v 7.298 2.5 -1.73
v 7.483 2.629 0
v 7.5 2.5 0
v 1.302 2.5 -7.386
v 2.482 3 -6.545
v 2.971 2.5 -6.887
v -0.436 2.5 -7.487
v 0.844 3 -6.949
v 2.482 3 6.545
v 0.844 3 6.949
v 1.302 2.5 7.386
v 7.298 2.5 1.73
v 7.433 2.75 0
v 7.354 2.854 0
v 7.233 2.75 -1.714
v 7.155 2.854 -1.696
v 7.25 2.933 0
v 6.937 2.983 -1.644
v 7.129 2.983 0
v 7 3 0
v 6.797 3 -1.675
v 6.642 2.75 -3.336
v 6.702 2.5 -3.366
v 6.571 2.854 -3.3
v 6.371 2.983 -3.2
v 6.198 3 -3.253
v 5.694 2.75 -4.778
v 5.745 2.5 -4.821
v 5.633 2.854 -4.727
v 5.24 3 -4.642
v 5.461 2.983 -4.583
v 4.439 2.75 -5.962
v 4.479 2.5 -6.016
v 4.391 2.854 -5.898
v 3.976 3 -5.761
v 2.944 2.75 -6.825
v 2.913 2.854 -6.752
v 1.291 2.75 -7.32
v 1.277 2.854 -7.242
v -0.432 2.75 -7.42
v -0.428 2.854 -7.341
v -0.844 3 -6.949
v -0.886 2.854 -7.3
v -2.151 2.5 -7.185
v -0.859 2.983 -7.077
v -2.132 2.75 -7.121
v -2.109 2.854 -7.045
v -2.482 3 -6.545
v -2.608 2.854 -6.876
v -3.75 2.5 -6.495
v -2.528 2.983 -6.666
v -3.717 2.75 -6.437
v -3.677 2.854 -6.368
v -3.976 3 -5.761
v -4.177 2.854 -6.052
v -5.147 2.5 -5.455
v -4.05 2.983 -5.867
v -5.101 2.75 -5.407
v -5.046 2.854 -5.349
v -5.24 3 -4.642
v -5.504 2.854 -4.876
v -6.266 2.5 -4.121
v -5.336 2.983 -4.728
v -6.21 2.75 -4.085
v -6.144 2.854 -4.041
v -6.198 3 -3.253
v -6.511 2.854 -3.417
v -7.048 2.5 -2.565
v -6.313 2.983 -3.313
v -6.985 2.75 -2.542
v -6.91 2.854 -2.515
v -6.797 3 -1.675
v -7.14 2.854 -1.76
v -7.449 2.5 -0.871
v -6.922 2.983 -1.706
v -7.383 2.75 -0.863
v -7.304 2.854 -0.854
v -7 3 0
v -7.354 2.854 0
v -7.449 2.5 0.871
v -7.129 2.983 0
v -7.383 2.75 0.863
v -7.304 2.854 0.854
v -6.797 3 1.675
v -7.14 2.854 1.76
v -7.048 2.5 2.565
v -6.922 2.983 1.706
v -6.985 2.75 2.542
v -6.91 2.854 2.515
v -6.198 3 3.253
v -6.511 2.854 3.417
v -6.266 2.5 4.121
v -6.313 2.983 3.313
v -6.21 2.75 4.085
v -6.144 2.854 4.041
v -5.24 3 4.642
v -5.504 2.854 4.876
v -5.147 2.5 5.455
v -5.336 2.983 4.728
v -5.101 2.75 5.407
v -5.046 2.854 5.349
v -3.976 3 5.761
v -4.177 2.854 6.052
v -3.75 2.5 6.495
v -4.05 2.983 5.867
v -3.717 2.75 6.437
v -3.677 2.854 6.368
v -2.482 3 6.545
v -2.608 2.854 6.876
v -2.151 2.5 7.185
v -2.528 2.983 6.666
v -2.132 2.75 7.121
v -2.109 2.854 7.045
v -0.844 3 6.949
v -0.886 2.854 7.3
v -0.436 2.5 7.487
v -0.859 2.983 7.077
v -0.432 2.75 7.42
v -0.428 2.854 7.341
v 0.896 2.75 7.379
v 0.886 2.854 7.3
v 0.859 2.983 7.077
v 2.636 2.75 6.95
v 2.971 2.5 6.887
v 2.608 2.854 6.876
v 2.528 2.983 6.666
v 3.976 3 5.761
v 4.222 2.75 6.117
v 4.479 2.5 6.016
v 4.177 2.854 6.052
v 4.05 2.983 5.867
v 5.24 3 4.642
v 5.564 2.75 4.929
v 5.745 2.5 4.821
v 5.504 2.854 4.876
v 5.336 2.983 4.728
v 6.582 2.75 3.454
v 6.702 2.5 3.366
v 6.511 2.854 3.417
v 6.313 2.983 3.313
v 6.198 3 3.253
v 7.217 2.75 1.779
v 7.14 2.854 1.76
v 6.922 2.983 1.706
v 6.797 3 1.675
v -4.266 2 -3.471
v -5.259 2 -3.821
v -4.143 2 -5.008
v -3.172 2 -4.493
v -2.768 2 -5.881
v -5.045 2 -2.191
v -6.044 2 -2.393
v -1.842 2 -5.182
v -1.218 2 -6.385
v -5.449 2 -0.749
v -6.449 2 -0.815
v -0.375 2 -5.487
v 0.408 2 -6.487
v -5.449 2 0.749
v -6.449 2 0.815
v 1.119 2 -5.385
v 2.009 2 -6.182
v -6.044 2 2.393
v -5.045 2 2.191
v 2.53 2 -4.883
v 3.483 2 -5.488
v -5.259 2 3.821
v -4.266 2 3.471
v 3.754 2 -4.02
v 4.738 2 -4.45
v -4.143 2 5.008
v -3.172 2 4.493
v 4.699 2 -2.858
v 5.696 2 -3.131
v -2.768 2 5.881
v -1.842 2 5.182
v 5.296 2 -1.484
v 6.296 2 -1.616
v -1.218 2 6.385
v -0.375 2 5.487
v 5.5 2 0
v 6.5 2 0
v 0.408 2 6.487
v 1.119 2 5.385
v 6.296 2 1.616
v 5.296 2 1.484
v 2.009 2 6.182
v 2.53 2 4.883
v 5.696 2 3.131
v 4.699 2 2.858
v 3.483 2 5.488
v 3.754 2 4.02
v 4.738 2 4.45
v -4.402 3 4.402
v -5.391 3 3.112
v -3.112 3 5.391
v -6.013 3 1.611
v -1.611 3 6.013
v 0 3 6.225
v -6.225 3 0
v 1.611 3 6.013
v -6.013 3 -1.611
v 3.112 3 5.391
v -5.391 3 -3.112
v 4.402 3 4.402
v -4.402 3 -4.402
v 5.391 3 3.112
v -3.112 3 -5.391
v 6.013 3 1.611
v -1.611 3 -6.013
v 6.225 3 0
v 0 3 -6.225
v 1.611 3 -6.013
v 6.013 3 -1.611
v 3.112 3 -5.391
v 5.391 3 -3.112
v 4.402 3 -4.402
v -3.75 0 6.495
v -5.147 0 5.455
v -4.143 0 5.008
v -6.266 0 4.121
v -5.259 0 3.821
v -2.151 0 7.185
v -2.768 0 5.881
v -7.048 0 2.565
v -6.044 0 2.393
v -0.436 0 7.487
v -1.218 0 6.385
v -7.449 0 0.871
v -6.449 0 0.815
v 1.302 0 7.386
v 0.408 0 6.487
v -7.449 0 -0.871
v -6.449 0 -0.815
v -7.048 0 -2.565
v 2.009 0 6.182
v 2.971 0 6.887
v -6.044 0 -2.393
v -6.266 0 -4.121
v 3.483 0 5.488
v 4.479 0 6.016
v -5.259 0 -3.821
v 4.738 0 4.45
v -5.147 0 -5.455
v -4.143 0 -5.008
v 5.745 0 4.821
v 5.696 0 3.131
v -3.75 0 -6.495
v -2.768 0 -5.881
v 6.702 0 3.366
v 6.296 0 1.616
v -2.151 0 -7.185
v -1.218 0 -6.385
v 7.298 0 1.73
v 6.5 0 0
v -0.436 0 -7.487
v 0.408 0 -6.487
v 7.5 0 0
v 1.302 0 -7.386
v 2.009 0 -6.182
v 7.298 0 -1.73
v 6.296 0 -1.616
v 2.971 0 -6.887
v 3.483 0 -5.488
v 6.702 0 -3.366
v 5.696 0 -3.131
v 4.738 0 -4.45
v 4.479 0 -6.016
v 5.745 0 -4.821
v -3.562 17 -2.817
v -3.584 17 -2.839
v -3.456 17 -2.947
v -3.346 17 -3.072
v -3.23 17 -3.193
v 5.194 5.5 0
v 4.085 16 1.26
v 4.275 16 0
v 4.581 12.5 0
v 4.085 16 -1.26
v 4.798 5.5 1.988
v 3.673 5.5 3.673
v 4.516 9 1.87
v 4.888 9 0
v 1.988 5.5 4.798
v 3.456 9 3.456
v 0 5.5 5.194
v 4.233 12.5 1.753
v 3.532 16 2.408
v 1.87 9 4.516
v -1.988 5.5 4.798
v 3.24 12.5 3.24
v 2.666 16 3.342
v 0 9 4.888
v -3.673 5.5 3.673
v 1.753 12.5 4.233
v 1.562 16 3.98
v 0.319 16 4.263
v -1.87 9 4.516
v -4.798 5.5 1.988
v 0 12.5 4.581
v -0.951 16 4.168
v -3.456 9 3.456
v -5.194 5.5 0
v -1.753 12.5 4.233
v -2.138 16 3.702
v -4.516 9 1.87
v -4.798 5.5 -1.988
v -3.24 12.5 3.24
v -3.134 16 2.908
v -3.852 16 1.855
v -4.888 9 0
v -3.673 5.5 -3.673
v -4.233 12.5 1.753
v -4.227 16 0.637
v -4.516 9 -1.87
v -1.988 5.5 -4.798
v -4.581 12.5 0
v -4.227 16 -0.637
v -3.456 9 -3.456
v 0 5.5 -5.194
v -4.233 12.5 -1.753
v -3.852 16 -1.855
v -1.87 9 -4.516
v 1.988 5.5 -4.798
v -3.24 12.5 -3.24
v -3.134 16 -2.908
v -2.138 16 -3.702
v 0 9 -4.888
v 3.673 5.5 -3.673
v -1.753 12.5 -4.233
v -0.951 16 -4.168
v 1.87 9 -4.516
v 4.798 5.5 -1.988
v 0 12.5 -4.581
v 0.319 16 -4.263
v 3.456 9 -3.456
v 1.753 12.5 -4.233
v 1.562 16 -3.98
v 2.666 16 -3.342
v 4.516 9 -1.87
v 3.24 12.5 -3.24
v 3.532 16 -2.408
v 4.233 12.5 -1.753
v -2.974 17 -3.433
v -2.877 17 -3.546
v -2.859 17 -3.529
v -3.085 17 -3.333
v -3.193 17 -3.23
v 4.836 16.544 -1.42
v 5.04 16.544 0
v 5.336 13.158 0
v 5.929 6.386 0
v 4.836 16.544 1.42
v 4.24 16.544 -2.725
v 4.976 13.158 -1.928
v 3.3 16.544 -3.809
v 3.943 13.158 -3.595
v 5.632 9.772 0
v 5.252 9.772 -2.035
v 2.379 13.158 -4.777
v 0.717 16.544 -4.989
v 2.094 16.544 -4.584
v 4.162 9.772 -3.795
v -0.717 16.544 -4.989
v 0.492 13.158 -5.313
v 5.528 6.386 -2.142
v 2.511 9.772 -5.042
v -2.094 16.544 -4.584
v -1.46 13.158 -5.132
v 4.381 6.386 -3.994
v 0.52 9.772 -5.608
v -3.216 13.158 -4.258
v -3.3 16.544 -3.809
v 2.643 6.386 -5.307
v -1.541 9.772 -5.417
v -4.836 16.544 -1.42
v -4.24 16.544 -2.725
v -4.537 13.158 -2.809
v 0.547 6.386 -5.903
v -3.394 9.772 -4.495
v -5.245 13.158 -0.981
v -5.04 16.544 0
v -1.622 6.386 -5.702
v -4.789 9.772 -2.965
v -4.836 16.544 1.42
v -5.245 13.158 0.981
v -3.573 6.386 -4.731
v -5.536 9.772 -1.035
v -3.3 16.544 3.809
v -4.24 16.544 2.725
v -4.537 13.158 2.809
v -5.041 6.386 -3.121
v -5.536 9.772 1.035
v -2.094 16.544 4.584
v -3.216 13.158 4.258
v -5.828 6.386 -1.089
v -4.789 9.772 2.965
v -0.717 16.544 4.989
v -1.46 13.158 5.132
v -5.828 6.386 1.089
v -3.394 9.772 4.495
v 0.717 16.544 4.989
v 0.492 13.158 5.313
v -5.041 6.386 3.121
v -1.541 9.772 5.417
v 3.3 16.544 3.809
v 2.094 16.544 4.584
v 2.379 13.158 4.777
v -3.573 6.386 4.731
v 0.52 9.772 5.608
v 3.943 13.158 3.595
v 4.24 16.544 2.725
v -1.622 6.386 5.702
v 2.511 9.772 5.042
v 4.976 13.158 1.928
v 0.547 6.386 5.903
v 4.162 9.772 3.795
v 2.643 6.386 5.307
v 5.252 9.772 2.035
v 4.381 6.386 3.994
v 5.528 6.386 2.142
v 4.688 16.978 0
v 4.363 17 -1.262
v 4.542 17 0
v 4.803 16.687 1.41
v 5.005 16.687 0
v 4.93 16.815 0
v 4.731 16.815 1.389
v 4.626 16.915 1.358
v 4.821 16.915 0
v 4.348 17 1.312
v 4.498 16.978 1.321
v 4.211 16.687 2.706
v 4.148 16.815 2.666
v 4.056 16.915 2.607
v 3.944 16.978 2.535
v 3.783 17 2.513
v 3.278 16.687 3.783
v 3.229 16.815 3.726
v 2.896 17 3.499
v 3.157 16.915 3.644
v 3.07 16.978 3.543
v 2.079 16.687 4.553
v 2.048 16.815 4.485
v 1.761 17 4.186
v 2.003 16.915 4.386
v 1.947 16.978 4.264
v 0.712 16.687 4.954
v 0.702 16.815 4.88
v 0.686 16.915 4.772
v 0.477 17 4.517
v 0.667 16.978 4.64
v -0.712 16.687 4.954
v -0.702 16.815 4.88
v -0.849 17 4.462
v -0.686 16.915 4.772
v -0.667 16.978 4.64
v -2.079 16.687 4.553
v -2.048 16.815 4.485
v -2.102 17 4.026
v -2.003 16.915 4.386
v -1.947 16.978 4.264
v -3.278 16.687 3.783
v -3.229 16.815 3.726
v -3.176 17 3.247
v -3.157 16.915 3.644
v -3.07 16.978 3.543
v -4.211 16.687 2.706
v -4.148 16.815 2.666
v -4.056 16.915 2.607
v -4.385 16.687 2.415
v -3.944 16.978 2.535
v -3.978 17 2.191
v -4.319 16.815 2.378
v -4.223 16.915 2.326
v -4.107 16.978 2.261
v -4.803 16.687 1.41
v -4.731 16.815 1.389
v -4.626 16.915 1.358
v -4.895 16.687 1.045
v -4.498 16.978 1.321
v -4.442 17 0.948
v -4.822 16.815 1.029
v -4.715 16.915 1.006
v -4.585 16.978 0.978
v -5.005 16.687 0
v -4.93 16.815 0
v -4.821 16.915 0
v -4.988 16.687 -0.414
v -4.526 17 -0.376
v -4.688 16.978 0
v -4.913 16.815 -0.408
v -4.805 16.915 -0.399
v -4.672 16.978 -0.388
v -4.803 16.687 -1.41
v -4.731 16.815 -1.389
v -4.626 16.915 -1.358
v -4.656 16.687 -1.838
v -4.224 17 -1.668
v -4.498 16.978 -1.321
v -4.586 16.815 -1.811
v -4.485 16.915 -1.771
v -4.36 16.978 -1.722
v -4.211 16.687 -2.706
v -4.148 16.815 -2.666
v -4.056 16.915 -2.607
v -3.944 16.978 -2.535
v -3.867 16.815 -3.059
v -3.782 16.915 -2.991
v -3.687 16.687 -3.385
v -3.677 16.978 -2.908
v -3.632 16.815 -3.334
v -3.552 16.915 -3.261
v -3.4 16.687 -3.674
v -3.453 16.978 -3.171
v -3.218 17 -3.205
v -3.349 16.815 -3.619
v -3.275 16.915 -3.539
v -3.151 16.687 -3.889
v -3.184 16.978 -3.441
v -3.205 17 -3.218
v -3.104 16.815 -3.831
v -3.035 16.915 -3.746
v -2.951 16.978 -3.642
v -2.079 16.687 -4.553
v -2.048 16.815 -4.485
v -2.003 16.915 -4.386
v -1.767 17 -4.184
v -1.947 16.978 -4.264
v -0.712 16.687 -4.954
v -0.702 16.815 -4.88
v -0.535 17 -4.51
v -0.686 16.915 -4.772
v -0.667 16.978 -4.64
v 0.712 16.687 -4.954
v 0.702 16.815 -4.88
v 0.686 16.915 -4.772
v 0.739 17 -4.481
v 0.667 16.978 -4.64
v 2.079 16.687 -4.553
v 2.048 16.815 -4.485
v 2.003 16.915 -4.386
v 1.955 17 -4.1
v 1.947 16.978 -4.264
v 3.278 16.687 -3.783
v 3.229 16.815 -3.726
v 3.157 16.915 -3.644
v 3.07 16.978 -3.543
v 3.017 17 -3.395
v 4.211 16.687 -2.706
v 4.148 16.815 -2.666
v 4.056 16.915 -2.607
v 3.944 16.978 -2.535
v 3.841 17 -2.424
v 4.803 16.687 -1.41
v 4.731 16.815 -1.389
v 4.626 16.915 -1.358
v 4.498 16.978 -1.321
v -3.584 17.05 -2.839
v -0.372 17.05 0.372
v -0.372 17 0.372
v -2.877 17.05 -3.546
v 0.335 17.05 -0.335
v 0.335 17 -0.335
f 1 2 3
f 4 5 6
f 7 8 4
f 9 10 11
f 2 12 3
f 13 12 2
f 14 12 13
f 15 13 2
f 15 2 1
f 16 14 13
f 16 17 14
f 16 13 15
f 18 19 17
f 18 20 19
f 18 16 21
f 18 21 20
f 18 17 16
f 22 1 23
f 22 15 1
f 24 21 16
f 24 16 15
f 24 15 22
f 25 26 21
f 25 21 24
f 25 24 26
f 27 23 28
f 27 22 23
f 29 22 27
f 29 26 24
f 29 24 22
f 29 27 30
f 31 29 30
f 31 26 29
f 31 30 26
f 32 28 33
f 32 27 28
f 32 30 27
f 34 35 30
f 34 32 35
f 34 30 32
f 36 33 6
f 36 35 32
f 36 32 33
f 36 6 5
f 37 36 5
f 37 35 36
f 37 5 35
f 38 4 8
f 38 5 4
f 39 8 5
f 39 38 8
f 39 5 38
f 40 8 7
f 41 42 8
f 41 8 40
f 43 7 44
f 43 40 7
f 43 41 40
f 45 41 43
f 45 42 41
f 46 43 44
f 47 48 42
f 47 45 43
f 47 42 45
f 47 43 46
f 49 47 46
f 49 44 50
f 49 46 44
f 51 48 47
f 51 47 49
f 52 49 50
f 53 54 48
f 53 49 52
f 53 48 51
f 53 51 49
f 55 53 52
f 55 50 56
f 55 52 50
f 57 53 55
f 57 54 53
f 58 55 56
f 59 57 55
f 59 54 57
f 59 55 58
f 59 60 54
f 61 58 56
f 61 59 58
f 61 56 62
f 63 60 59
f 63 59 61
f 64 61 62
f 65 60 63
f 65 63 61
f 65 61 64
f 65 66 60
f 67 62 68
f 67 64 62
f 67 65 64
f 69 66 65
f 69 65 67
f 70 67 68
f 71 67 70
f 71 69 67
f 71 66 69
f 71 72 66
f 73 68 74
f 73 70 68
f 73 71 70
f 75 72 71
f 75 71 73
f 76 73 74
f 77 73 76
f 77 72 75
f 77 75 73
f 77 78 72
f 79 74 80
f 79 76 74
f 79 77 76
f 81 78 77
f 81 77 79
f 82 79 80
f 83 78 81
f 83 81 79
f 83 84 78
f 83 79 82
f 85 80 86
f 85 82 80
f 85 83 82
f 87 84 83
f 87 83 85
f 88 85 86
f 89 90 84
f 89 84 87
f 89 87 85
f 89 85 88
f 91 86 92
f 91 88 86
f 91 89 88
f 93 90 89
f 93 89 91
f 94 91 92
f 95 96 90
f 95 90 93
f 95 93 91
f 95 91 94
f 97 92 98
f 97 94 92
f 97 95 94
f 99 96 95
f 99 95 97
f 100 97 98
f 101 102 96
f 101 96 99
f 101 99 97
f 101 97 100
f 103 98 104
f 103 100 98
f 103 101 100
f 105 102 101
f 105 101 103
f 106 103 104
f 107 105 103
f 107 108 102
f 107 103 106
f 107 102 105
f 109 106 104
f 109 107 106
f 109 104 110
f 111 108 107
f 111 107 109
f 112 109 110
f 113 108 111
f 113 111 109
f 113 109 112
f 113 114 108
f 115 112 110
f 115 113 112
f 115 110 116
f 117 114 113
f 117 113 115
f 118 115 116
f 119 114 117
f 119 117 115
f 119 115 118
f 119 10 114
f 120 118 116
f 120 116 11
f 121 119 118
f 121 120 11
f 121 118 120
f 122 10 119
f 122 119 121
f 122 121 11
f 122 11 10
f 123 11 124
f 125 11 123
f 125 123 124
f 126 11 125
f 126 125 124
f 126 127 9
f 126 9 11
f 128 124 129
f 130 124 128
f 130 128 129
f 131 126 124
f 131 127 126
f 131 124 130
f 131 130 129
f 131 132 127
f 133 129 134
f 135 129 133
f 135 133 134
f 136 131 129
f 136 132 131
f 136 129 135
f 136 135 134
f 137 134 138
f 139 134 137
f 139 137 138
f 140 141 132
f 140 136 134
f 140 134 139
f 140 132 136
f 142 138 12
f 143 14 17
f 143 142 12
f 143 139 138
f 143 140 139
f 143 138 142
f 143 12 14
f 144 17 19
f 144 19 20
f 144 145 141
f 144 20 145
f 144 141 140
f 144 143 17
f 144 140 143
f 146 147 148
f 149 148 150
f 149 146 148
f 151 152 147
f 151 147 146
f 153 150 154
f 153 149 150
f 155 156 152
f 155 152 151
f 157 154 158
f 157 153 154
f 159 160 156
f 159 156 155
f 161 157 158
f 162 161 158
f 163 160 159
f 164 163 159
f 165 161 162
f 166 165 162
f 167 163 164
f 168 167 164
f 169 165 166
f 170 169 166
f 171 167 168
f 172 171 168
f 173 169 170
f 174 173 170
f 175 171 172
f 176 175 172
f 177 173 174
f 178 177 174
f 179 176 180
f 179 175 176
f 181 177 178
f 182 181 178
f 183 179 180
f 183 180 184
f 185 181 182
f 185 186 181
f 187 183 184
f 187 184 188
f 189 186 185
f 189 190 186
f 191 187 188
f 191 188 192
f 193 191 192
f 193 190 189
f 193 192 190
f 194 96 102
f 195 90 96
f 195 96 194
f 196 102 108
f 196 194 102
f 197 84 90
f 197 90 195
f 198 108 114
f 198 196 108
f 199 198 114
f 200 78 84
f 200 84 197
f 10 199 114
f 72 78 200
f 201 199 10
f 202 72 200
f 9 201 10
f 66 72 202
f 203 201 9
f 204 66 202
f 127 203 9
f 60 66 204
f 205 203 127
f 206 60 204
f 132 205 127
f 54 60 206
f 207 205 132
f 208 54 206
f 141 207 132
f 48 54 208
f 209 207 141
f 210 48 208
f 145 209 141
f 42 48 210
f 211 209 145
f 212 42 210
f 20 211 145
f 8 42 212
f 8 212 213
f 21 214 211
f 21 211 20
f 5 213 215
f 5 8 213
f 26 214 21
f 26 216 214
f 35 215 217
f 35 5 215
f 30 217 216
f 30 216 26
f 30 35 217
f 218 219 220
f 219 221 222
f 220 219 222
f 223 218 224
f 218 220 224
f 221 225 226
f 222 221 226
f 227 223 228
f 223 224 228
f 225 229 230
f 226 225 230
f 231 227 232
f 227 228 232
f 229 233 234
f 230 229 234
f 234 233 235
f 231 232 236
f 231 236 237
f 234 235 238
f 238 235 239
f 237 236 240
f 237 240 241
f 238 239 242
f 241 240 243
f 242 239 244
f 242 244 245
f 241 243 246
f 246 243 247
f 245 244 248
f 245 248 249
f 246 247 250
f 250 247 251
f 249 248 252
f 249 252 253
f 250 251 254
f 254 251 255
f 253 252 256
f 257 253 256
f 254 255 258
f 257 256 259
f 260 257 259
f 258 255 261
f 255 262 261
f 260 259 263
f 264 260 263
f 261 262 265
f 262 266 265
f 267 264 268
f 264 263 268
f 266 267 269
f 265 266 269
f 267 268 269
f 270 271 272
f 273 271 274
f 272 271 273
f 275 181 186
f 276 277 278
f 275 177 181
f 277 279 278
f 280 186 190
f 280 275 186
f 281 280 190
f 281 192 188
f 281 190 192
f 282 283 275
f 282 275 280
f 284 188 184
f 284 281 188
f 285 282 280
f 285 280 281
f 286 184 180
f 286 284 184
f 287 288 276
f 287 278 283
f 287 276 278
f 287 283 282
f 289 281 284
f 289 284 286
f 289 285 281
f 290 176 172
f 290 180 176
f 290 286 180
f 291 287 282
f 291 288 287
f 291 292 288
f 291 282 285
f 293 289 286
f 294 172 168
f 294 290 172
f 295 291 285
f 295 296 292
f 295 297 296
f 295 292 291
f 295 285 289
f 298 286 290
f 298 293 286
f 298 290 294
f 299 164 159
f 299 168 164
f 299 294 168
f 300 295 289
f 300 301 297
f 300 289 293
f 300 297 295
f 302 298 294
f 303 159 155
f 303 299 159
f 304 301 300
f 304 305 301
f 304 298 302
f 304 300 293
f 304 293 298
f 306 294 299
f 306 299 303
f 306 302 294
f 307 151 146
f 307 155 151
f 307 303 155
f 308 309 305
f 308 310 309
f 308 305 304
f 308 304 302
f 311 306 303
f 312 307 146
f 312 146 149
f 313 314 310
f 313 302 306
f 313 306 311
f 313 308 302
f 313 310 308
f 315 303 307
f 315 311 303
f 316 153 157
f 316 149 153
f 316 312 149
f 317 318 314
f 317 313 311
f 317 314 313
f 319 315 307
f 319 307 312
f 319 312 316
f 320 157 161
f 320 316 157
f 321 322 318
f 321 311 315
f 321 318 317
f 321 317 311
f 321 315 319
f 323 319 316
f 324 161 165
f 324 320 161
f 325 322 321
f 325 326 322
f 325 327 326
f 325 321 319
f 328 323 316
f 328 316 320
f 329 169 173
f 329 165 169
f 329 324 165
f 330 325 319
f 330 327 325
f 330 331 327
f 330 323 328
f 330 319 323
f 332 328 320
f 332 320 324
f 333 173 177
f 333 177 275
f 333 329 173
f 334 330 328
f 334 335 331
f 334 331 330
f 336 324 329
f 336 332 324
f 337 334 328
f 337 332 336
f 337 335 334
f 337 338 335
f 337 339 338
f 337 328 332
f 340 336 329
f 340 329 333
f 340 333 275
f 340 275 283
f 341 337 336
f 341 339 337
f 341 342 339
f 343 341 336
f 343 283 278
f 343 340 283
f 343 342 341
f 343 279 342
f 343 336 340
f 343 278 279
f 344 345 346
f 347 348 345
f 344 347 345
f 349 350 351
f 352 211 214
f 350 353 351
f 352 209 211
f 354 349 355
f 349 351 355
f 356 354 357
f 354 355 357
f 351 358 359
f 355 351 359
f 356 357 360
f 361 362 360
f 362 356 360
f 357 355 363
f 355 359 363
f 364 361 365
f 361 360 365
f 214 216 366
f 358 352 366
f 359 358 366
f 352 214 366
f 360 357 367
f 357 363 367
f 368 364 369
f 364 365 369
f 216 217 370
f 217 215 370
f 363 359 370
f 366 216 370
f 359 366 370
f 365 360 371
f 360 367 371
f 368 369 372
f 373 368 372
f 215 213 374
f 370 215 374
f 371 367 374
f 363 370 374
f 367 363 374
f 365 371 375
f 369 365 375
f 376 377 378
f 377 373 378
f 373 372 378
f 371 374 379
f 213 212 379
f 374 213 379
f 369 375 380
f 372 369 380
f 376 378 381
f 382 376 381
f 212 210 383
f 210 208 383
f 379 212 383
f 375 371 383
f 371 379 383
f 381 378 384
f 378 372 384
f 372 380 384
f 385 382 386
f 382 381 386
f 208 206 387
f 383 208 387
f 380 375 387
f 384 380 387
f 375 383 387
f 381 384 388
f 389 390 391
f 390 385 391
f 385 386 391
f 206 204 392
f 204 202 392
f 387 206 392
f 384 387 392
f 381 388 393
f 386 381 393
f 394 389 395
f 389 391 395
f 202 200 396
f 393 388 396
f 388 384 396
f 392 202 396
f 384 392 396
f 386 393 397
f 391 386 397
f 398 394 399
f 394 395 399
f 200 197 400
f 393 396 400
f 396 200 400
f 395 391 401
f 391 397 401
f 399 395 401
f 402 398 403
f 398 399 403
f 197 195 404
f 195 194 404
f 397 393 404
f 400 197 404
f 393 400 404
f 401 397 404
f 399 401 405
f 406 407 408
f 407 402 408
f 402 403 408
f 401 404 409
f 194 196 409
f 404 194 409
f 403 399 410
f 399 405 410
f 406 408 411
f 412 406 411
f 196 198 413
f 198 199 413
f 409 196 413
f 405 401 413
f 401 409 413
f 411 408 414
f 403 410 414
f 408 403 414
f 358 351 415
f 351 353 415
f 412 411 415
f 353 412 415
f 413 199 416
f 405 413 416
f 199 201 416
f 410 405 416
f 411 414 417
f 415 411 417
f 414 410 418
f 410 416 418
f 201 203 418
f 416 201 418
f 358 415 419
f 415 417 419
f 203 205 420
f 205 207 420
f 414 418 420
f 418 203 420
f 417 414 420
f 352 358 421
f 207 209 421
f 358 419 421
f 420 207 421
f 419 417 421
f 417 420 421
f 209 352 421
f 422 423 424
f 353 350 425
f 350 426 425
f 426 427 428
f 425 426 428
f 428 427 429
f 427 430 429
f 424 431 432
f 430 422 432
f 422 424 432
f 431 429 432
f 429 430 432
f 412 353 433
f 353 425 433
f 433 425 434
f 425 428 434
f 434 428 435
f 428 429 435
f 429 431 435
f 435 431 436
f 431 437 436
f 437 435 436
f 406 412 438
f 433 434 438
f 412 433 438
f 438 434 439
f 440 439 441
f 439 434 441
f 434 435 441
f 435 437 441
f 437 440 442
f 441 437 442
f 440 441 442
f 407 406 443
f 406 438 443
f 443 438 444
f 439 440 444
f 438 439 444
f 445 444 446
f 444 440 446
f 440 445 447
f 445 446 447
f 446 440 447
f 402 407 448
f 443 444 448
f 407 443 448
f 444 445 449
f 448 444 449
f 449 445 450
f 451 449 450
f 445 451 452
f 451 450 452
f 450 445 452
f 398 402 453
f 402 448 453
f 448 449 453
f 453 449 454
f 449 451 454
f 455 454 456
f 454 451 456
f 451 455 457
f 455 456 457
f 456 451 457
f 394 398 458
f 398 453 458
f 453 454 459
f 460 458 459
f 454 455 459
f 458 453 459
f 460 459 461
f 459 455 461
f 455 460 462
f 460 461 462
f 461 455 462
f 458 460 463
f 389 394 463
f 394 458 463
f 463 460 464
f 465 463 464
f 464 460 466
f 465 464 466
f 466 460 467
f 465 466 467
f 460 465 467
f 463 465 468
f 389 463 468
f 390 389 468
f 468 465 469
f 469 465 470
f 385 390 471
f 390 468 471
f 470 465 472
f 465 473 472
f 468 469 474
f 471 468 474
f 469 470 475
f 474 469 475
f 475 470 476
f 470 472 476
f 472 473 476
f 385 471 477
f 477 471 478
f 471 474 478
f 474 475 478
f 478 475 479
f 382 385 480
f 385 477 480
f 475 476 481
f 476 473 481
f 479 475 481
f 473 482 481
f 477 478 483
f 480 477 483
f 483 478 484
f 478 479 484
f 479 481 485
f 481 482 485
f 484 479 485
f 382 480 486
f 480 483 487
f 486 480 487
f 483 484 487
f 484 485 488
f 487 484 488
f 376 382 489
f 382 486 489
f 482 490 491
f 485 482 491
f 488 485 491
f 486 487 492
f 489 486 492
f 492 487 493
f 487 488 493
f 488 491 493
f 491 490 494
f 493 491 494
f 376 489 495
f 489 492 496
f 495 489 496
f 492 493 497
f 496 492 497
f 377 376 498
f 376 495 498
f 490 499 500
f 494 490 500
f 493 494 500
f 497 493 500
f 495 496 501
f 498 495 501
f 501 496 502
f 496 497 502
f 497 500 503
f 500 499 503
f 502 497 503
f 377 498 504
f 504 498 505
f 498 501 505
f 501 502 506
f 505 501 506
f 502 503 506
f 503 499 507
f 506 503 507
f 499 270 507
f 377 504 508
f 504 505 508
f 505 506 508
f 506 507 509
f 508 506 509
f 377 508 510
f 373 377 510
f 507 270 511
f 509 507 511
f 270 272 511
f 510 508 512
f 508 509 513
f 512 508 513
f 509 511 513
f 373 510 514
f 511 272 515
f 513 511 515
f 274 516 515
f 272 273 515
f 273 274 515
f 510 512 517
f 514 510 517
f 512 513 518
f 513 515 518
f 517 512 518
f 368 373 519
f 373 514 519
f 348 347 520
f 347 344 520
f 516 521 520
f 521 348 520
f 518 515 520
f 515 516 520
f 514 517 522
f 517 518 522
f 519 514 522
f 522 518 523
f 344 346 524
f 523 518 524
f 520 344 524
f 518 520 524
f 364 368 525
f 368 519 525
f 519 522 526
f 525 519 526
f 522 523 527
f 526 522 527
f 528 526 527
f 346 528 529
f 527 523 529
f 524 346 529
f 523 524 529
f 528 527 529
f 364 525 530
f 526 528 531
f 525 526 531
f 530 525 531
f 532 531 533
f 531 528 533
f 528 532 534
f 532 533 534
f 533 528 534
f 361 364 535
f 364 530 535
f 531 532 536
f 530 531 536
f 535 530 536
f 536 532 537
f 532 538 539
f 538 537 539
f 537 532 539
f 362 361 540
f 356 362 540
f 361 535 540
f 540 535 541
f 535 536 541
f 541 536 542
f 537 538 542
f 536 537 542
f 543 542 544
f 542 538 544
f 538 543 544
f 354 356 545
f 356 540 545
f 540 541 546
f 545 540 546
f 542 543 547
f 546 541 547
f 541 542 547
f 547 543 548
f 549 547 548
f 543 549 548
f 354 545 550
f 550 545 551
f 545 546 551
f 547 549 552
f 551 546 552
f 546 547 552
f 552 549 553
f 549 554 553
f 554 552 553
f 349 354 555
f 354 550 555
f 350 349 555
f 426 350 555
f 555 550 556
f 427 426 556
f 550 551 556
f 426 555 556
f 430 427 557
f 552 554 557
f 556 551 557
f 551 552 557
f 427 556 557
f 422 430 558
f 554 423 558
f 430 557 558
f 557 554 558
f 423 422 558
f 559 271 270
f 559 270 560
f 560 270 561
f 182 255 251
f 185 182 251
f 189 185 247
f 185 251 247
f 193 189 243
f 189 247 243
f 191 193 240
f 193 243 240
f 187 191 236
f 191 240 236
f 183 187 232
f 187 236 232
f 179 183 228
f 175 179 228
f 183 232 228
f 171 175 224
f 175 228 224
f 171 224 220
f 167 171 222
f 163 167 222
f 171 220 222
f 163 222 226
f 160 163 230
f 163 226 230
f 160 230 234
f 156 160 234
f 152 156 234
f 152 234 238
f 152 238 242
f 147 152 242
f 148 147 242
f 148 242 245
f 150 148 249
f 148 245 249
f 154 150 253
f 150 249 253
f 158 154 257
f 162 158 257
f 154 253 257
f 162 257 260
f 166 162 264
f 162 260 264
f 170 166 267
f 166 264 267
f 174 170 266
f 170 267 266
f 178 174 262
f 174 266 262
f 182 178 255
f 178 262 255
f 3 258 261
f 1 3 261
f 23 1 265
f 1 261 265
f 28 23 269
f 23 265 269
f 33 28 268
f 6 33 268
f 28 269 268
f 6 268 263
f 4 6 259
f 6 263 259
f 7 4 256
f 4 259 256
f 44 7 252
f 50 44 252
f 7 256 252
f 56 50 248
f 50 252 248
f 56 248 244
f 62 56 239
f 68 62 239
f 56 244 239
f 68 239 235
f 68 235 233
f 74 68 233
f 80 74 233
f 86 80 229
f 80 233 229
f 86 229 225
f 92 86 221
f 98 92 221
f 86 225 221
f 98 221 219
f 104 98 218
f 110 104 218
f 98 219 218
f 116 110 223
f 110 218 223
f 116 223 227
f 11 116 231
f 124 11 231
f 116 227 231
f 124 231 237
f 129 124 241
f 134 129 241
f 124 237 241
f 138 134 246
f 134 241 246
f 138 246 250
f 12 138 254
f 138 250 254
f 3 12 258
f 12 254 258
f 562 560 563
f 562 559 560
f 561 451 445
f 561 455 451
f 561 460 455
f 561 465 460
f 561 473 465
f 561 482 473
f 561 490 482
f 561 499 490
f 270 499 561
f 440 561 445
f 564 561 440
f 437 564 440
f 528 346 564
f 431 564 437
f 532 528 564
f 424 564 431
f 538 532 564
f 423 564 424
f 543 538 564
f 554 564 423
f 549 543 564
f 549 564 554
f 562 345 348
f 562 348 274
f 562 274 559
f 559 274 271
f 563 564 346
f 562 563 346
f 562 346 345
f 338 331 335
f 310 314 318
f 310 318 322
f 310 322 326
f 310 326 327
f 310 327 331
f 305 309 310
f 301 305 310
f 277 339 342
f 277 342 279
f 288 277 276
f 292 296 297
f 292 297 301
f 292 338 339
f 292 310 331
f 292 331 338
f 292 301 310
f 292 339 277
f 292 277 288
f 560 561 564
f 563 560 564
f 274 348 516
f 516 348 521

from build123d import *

# Parameters (mm, degrees)
SKETCH1_R           = 7.5
BOSS_EXTRUDE1_DEPTH = 3
SKETCH2_R           = 5
BOSS_EXTRUDE2_DEPTH = 14
BOSS_EXTRUDE2_TAPER = -5
SKETCH4_R           = 6.5
CUT_EXTRUDE1_DEPTH  = 2
SKETCH5_R           = 5.5
CUT_EXTRUDE2_DEPTH  = 14
CUT_EXTRUDE2_TAPER  = 5
FILLET1_R           = 0.5
FILLET2_R           = 0.5
BOSS_EXTRUDE3_DEPTH = 0.05


with BuildPart() as part:
    # Sketch1 → Boss-Extrude1 (new body)
    with BuildSketch(Plane(origin=(0, 0, 0), x_dir=(1, 0, 0), z_dir=(0, 1, 0))):
        Circle(SKETCH1_R)
    extrude(amount=BOSS_EXTRUDE1_DEPTH)

    # Sketch2 → Boss-Extrude2 (add)
    with BuildSketch(Plane(origin=(0, 17, 0), x_dir=(1, 0, 0), z_dir=(0, 1, 0))):
        Circle(SKETCH2_R)
    extrude(amount=-BOSS_EXTRUDE2_DEPTH, taper=BOSS_EXTRUDE2_TAPER)

    # Sketch4 → Cut-Extrude1 (cut)
    with BuildSketch(Plane.XZ):
        Circle(SKETCH4_R)
    extrude(amount=-CUT_EXTRUDE1_DEPTH, mode=Mode.SUBTRACT)

    # Sketch5 → Cut-Extrude2 (cut)
    with BuildSketch(Plane.XZ.offset(-2)):
        Circle(SKETCH5_R)
    extrude(amount=-CUT_EXTRUDE2_DEPTH, taper=CUT_EXTRUDE2_TAPER, mode=Mode.SUBTRACT)

    # Fillet1
    fillet1_edges = [part.edges().sort_by_distance(p)[0] for p in [
        (-7.5, 3, 0),
    ]]
    fillet(fillet1_edges, radius=FILLET1_R)

    # Fillet2
    fillet2_edges = [part.edges().sort_by_distance(p)[0] for p in [
        (-5, 17, 0),
    ]]
    fillet(fillet2_edges, radius=FILLET2_R)

    # Sketch7 → Boss-Extrude3 (add)
    with BuildSketch(Plane(origin=(0, 17, 0), x_dir=(1, 0, 0), z_dir=(0, 1, 0))):
        Polygon((-0.372418319, -0.372418319), (0.334688462, 0.334688462), (-2.876818043, 3.546194967), (-3.583924824, 2.839088186), align=None)
    extrude(amount=BOSS_EXTRUDE3_DEPTH)


solid = part.part
